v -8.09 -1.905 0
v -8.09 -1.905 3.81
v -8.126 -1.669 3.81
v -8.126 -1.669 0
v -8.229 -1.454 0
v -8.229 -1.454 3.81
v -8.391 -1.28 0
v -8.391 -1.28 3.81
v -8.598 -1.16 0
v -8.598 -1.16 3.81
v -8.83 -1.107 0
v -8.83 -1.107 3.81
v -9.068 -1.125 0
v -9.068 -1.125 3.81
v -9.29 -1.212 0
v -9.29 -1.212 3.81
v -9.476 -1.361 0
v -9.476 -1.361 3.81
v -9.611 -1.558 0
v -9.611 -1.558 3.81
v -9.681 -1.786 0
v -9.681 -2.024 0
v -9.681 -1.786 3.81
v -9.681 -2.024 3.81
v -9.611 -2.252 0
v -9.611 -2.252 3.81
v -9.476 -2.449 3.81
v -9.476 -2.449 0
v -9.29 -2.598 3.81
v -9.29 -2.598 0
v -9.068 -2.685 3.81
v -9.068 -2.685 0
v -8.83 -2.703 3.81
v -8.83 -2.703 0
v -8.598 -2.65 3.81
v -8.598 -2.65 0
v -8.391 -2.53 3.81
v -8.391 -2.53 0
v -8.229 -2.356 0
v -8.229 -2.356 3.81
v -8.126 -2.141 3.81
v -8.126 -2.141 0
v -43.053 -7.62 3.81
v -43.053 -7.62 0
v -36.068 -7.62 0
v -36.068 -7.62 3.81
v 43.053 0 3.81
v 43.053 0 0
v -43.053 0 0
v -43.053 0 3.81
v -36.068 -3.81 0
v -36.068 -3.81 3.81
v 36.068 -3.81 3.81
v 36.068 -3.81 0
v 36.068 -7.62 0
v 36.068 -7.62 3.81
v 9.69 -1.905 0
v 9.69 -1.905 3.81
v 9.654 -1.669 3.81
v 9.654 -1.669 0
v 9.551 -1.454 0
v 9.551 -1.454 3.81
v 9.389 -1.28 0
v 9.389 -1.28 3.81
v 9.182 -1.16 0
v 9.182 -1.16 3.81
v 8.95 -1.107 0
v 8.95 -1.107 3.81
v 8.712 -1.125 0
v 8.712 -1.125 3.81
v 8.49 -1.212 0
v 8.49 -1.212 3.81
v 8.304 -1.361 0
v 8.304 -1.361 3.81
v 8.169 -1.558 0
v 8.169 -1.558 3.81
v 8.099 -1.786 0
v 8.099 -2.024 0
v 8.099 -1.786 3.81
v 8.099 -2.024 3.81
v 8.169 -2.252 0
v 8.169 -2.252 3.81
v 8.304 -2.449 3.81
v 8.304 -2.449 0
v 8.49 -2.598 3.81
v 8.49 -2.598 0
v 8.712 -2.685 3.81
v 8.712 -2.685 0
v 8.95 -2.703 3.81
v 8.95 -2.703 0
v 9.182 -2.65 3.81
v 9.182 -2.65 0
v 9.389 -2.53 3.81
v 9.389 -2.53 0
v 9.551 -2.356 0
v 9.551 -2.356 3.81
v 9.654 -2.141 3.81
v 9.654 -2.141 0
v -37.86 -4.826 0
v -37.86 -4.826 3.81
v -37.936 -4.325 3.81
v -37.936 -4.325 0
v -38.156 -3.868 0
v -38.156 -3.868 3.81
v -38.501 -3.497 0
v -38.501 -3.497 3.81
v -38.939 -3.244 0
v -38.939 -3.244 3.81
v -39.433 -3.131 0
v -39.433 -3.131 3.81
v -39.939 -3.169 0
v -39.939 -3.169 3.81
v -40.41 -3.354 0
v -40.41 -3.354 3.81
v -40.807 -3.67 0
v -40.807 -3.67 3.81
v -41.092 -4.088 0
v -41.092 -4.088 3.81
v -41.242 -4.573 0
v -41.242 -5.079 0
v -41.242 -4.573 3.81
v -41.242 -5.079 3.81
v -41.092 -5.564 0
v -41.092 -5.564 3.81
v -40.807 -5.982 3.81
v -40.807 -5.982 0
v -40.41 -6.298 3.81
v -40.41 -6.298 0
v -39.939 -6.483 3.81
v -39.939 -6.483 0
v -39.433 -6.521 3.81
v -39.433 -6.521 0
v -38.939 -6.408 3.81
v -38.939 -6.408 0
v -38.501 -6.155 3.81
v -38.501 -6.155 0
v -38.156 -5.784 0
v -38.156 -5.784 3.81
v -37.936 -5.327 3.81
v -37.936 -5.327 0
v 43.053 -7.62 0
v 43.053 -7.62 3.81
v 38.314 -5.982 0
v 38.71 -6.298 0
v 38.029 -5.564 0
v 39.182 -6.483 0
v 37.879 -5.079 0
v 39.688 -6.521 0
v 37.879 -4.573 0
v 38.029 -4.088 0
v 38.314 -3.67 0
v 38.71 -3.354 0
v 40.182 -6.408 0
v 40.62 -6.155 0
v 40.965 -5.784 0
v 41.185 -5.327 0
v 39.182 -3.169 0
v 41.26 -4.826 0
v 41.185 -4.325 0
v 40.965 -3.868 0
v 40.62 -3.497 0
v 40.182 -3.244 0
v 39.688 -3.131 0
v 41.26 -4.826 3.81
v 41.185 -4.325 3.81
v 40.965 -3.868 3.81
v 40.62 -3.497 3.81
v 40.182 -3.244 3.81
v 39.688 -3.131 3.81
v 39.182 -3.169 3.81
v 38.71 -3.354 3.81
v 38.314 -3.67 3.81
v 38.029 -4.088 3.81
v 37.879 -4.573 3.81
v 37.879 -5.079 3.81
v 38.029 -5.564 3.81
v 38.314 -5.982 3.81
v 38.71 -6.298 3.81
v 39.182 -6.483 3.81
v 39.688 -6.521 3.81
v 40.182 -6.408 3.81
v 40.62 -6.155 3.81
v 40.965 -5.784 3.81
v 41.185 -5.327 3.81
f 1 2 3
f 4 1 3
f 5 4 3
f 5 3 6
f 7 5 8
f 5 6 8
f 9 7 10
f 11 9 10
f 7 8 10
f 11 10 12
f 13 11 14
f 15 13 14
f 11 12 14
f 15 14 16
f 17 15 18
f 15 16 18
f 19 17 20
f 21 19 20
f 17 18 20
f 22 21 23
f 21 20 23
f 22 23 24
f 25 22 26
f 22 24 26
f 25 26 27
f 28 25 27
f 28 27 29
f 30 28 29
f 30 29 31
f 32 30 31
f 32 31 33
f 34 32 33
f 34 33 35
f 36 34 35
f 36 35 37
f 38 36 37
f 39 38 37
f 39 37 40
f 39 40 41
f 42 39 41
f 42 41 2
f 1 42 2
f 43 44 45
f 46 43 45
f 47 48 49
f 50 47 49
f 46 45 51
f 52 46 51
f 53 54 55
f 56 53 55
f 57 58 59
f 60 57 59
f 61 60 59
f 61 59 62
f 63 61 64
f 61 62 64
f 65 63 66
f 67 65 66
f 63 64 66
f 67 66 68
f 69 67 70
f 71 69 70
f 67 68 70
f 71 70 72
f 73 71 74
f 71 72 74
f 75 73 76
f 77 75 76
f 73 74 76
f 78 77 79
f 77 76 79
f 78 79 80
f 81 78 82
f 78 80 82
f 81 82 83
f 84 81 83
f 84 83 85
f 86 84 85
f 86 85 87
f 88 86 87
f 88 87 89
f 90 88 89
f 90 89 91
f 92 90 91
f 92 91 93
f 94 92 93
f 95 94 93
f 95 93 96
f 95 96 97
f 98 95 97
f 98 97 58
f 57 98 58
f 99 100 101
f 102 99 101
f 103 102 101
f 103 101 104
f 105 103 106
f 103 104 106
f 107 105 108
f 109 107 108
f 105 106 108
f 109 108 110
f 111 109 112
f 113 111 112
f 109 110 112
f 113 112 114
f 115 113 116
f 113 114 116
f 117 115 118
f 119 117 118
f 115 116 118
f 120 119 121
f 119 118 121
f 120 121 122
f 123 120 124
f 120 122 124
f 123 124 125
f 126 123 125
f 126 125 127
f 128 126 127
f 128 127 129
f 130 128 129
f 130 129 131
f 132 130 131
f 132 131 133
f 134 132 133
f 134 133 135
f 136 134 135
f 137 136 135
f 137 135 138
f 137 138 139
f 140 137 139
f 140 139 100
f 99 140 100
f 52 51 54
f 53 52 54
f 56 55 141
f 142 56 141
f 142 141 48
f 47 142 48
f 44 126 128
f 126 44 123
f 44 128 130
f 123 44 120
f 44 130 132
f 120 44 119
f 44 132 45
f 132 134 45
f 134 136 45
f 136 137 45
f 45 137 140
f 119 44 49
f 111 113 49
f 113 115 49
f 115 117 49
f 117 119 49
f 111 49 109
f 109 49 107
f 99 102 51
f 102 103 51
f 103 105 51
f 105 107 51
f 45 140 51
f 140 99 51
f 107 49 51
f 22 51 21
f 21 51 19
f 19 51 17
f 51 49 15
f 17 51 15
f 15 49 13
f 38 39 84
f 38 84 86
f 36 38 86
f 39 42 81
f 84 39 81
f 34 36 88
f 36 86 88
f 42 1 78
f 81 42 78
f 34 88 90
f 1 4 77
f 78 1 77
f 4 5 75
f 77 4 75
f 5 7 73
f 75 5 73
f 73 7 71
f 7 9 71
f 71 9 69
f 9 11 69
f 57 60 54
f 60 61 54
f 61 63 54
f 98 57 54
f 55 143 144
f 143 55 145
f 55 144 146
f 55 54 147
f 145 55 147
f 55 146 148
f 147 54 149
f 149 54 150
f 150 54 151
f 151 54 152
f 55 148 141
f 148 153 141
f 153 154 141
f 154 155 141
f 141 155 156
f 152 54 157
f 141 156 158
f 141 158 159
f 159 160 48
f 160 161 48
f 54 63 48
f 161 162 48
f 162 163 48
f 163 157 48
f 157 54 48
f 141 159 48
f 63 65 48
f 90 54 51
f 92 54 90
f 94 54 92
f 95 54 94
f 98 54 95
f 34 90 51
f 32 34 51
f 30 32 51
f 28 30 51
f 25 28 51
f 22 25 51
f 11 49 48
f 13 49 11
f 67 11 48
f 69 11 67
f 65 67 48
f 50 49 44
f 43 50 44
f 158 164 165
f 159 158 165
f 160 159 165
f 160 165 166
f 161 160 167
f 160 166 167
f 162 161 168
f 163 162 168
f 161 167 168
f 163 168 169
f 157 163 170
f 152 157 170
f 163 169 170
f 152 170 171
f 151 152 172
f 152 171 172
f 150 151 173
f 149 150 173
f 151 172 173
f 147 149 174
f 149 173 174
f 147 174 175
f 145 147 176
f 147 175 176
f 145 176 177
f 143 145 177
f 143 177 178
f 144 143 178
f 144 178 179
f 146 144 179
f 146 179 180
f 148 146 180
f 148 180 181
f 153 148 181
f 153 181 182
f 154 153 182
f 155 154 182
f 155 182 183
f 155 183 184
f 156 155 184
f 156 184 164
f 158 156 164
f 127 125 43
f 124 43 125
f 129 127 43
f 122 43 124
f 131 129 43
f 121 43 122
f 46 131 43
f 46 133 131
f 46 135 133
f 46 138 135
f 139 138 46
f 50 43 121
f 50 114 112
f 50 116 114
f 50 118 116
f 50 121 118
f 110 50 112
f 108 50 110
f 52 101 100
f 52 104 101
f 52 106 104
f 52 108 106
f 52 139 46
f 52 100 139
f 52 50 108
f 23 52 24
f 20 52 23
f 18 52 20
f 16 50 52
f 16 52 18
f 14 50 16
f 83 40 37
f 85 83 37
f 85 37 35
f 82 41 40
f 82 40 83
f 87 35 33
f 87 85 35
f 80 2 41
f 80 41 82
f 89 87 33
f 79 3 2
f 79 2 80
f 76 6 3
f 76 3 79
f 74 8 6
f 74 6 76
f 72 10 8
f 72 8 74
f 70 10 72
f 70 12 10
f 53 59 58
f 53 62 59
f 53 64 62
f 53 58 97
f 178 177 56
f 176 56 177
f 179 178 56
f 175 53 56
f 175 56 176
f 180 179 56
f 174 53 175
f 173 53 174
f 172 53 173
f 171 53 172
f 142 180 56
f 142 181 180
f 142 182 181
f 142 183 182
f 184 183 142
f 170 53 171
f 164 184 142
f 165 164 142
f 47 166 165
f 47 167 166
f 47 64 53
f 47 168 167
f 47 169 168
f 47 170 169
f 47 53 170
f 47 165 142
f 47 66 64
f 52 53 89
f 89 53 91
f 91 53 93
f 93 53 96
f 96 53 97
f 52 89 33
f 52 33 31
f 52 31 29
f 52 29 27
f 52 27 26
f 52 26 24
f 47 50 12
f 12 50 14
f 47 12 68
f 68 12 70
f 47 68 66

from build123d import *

# Parameters (mm, degrees)
PAD_DEPTH     = 3.81
SKETCH001_R   = 1.7
HOLE_DEPTH    = 24.892
SKETCH002_R   = 0.8
HOLE001_DEPTH = 24.892


with BuildPart() as part:
    # Sketch → Pad (new body)
    with BuildSketch(Plane.XY):
        Polygon((-43.053, 0), (-43.053, -7.62), (-36.068, -7.62), (-36.068, -3.81), (36.068, -3.81), (36.068, -7.62), (43.053, -7.62), (43.053, 0), align=None)
    extrude(amount=PAD_DEPTH)

    # Sketch001 (on Face10 of Pad) → Hole (cut)
    with BuildSketch(Plane.XY.offset(3.81)):
        with Locations((-39.5605, -4.826)):
            Circle(SKETCH001_R)
        with Locations((39.5605, -4.826)):
            Circle(SKETCH001_R)
    extrude(amount=-HOLE_DEPTH, mode=Mode.SUBTRACT)

    # Sketch002 (on Face5 of Hole) → Hole001 (cut)
    with BuildSketch(Plane.XY.offset(3.81)):
        with Locations((-8.89, -1.905)):
            Circle(SKETCH002_R)
        with Locations((8.89, -1.905)):
            Circle(SKETCH002_R)
    extrude(amount=-HOLE001_DEPTH, mode=Mode.SUBTRACT)


solid = part.part
